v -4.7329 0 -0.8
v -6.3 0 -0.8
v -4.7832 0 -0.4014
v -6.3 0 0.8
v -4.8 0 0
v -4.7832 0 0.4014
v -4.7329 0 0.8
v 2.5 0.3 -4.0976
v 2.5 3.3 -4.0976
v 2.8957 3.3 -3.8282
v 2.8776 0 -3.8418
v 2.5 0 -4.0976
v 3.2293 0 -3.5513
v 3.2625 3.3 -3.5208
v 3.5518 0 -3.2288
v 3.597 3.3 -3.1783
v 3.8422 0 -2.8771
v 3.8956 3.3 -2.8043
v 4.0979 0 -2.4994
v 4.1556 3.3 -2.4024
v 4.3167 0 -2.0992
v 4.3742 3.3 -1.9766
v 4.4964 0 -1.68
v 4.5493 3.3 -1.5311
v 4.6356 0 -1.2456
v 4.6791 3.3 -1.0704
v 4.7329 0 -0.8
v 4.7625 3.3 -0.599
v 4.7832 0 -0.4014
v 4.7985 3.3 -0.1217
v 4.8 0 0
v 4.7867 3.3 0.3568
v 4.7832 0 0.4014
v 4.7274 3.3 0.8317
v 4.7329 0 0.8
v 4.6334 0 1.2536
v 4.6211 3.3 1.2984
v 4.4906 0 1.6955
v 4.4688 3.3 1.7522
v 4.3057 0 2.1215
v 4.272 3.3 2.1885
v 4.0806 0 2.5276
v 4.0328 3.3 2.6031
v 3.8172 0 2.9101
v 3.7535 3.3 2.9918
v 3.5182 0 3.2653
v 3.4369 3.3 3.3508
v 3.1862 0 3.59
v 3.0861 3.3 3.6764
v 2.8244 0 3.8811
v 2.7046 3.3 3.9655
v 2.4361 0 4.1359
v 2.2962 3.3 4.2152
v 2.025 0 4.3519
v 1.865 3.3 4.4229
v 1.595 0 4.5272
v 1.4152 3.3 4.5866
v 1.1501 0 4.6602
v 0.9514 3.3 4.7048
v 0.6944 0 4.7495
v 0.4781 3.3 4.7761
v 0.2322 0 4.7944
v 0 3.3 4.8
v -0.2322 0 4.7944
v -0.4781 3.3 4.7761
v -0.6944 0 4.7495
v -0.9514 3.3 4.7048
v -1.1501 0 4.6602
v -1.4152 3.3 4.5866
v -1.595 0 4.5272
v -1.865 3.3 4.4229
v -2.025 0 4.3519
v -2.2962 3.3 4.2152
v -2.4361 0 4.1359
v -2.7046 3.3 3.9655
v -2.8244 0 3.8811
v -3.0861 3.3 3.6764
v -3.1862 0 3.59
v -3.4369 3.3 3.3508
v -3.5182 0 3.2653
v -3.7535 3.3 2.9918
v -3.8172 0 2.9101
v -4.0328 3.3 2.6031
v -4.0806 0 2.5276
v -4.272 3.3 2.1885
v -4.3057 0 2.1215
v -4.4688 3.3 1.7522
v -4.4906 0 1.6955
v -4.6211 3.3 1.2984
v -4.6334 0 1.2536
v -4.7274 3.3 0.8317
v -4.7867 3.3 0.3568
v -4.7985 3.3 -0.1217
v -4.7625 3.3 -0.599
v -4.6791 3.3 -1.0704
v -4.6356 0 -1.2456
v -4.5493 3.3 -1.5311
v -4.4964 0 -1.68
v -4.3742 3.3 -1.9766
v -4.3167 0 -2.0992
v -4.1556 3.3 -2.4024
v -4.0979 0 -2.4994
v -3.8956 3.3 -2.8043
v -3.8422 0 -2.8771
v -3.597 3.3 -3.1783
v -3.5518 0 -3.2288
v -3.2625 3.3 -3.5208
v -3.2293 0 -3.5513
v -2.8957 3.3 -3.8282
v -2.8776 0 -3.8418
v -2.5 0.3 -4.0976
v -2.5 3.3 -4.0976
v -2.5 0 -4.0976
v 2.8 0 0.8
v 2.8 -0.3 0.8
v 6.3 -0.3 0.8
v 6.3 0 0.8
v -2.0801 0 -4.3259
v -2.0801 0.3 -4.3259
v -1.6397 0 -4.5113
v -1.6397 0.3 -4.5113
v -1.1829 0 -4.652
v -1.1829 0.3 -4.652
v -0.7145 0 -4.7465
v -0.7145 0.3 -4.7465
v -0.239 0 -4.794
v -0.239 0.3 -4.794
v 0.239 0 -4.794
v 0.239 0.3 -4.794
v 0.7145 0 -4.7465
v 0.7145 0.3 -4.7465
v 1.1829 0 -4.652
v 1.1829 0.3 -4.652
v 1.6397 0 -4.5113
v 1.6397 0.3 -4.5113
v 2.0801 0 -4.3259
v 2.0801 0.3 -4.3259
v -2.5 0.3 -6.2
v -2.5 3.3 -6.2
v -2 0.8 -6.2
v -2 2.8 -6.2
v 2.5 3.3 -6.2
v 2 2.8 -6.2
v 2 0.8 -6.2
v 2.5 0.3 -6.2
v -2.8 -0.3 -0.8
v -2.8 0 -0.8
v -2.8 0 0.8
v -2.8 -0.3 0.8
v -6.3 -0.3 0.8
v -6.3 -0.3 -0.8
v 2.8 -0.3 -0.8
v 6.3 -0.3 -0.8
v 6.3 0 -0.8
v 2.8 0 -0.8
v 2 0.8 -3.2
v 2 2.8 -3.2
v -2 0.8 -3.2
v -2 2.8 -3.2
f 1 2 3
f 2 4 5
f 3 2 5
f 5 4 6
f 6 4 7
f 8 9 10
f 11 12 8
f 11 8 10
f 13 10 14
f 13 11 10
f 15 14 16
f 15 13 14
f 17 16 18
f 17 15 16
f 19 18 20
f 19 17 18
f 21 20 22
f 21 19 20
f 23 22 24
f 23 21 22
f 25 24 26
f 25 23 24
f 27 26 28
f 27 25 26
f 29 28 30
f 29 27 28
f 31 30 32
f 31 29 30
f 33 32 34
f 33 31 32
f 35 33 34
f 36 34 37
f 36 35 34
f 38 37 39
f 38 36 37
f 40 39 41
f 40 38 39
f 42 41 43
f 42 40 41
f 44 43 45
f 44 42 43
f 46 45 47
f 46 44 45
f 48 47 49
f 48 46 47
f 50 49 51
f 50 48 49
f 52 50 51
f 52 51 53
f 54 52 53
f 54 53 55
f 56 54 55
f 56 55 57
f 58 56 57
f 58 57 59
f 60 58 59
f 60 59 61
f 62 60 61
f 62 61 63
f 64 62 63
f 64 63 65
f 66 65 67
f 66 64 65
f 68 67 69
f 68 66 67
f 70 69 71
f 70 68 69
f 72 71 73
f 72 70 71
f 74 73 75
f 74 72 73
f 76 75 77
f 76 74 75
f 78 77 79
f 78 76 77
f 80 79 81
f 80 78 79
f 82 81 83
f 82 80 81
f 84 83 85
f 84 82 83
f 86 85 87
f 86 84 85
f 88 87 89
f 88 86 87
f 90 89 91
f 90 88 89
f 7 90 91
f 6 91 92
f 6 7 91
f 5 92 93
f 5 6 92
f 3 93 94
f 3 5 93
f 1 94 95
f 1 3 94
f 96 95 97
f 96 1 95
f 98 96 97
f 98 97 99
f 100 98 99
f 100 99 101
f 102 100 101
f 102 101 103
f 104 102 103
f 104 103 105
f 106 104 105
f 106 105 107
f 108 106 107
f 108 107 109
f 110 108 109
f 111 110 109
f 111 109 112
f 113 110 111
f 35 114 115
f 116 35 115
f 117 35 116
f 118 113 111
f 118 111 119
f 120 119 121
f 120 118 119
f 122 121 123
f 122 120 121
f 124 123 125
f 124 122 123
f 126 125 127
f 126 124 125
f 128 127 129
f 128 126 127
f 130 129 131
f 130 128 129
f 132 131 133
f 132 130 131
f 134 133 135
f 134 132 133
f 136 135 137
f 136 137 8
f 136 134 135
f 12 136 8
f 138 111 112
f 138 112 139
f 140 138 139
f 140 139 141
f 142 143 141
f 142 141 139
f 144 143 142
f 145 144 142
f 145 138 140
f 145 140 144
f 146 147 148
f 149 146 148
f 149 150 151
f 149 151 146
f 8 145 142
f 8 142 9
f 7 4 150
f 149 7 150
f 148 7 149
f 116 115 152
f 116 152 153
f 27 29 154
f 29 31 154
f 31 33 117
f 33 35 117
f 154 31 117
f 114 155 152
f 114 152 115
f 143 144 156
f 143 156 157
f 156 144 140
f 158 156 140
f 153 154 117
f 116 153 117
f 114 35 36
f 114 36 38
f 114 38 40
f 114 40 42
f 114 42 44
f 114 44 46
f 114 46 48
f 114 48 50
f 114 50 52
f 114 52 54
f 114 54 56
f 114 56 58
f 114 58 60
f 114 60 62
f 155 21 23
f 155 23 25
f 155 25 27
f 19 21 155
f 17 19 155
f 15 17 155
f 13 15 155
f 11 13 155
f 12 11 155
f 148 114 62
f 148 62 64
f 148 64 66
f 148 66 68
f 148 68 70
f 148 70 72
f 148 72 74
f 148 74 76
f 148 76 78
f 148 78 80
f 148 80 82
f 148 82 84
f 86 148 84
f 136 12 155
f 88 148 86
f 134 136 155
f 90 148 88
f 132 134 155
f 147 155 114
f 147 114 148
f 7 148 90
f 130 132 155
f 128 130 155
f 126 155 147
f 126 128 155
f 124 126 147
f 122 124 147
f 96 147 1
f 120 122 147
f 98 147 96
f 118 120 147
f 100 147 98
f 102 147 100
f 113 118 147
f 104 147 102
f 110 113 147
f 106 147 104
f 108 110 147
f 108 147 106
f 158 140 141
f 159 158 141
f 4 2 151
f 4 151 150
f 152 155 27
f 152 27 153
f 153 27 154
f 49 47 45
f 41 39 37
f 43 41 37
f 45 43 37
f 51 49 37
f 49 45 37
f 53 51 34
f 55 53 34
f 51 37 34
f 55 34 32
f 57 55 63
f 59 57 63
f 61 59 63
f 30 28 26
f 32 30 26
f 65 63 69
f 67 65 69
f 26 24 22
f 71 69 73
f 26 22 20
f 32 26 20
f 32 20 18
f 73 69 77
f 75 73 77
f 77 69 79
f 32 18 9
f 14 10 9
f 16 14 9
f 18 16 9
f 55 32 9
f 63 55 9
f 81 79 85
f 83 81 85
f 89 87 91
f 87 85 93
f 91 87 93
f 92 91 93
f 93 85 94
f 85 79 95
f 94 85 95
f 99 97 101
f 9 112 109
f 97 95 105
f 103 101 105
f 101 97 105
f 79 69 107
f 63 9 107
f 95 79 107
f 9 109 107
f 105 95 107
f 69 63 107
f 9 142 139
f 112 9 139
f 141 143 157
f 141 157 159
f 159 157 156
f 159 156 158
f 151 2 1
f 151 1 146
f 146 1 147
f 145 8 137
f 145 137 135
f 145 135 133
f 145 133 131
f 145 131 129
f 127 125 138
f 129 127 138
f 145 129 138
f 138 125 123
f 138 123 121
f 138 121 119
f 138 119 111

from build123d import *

# Parameters (mm, degrees)
BOSS_EXTRUDE1_DEPTH = 3.3
SKETCH2_W           = 3.5
SKETCH2_H           = 1.6
BOSS_EXTRUDE2_DEPTH = 0.3
CUT_EXTRUDE1_DEPTH  = 0.3
SKETCH4_W           = 4
SKETCH4_H           = 2
CUT_EXTRUDE2_DEPTH  = 3


with BuildPart() as part:
    # Sketch1 → Boss-Extrude1 (new body)
    with BuildSketch(Plane(origin=(0, 0, 0), x_dir=(1, 0, 0), z_dir=(0, 1, 0))):
        with BuildLine():
            Line((-2.5, 4.09756025), (-2.5, 6.2))
            Line((-2.5, 6.2), (2.5, 6.2))
            Line((2.5, 6.2), (2.5, 4.09756025))
            ThreePointArc((2.5, 4.09756025), (0, -4.8), (-2.5, 4.09756025))
        make_face()
    extrude(amount=BOSS_EXTRUDE1_DEPTH)

    # Sketch2 → Boss-Extrude2 (add)
    with BuildSketch(Plane.XZ):
        with Locations((-4.55, 0)):
            Rectangle(SKETCH2_W, SKETCH2_H)
        with Locations((4.55, 0)):
            Rectangle(SKETCH2_W, SKETCH2_H)
    extrude(amount=BOSS_EXTRUDE2_DEPTH)

    # Sketch3 → Cut-Extrude1 (cut)
    with BuildSketch(Plane.XZ):
        with BuildLine():
            Line((2.5, -4.09756025), (2.5, -6.2))
            Line((2.5, -6.2), (-2.5, -6.2))
            Line((-2.5, -6.2), (-2.5, -4.09756025))
            ThreePointArc((-2.5, -4.09756025), (0, -4.8), (2.5, -4.09756025))
        make_face()
    extrude(amount=-CUT_EXTRUDE1_DEPTH, mode=Mode.SUBTRACT)

    # Sketch4 → Cut-Extrude2 (cut)
    with BuildSketch(Plane(origin=(0, 0, -6.2), x_dir=(-1, 0, 0), z_dir=(0, 0, -1))):
        with Locations((0, 1.8)):
            Rectangle(SKETCH4_W, SKETCH4_H)
    extrude(amount=-CUT_EXTRUDE2_DEPTH, mode=Mode.SUBTRACT)


solid = part.part
